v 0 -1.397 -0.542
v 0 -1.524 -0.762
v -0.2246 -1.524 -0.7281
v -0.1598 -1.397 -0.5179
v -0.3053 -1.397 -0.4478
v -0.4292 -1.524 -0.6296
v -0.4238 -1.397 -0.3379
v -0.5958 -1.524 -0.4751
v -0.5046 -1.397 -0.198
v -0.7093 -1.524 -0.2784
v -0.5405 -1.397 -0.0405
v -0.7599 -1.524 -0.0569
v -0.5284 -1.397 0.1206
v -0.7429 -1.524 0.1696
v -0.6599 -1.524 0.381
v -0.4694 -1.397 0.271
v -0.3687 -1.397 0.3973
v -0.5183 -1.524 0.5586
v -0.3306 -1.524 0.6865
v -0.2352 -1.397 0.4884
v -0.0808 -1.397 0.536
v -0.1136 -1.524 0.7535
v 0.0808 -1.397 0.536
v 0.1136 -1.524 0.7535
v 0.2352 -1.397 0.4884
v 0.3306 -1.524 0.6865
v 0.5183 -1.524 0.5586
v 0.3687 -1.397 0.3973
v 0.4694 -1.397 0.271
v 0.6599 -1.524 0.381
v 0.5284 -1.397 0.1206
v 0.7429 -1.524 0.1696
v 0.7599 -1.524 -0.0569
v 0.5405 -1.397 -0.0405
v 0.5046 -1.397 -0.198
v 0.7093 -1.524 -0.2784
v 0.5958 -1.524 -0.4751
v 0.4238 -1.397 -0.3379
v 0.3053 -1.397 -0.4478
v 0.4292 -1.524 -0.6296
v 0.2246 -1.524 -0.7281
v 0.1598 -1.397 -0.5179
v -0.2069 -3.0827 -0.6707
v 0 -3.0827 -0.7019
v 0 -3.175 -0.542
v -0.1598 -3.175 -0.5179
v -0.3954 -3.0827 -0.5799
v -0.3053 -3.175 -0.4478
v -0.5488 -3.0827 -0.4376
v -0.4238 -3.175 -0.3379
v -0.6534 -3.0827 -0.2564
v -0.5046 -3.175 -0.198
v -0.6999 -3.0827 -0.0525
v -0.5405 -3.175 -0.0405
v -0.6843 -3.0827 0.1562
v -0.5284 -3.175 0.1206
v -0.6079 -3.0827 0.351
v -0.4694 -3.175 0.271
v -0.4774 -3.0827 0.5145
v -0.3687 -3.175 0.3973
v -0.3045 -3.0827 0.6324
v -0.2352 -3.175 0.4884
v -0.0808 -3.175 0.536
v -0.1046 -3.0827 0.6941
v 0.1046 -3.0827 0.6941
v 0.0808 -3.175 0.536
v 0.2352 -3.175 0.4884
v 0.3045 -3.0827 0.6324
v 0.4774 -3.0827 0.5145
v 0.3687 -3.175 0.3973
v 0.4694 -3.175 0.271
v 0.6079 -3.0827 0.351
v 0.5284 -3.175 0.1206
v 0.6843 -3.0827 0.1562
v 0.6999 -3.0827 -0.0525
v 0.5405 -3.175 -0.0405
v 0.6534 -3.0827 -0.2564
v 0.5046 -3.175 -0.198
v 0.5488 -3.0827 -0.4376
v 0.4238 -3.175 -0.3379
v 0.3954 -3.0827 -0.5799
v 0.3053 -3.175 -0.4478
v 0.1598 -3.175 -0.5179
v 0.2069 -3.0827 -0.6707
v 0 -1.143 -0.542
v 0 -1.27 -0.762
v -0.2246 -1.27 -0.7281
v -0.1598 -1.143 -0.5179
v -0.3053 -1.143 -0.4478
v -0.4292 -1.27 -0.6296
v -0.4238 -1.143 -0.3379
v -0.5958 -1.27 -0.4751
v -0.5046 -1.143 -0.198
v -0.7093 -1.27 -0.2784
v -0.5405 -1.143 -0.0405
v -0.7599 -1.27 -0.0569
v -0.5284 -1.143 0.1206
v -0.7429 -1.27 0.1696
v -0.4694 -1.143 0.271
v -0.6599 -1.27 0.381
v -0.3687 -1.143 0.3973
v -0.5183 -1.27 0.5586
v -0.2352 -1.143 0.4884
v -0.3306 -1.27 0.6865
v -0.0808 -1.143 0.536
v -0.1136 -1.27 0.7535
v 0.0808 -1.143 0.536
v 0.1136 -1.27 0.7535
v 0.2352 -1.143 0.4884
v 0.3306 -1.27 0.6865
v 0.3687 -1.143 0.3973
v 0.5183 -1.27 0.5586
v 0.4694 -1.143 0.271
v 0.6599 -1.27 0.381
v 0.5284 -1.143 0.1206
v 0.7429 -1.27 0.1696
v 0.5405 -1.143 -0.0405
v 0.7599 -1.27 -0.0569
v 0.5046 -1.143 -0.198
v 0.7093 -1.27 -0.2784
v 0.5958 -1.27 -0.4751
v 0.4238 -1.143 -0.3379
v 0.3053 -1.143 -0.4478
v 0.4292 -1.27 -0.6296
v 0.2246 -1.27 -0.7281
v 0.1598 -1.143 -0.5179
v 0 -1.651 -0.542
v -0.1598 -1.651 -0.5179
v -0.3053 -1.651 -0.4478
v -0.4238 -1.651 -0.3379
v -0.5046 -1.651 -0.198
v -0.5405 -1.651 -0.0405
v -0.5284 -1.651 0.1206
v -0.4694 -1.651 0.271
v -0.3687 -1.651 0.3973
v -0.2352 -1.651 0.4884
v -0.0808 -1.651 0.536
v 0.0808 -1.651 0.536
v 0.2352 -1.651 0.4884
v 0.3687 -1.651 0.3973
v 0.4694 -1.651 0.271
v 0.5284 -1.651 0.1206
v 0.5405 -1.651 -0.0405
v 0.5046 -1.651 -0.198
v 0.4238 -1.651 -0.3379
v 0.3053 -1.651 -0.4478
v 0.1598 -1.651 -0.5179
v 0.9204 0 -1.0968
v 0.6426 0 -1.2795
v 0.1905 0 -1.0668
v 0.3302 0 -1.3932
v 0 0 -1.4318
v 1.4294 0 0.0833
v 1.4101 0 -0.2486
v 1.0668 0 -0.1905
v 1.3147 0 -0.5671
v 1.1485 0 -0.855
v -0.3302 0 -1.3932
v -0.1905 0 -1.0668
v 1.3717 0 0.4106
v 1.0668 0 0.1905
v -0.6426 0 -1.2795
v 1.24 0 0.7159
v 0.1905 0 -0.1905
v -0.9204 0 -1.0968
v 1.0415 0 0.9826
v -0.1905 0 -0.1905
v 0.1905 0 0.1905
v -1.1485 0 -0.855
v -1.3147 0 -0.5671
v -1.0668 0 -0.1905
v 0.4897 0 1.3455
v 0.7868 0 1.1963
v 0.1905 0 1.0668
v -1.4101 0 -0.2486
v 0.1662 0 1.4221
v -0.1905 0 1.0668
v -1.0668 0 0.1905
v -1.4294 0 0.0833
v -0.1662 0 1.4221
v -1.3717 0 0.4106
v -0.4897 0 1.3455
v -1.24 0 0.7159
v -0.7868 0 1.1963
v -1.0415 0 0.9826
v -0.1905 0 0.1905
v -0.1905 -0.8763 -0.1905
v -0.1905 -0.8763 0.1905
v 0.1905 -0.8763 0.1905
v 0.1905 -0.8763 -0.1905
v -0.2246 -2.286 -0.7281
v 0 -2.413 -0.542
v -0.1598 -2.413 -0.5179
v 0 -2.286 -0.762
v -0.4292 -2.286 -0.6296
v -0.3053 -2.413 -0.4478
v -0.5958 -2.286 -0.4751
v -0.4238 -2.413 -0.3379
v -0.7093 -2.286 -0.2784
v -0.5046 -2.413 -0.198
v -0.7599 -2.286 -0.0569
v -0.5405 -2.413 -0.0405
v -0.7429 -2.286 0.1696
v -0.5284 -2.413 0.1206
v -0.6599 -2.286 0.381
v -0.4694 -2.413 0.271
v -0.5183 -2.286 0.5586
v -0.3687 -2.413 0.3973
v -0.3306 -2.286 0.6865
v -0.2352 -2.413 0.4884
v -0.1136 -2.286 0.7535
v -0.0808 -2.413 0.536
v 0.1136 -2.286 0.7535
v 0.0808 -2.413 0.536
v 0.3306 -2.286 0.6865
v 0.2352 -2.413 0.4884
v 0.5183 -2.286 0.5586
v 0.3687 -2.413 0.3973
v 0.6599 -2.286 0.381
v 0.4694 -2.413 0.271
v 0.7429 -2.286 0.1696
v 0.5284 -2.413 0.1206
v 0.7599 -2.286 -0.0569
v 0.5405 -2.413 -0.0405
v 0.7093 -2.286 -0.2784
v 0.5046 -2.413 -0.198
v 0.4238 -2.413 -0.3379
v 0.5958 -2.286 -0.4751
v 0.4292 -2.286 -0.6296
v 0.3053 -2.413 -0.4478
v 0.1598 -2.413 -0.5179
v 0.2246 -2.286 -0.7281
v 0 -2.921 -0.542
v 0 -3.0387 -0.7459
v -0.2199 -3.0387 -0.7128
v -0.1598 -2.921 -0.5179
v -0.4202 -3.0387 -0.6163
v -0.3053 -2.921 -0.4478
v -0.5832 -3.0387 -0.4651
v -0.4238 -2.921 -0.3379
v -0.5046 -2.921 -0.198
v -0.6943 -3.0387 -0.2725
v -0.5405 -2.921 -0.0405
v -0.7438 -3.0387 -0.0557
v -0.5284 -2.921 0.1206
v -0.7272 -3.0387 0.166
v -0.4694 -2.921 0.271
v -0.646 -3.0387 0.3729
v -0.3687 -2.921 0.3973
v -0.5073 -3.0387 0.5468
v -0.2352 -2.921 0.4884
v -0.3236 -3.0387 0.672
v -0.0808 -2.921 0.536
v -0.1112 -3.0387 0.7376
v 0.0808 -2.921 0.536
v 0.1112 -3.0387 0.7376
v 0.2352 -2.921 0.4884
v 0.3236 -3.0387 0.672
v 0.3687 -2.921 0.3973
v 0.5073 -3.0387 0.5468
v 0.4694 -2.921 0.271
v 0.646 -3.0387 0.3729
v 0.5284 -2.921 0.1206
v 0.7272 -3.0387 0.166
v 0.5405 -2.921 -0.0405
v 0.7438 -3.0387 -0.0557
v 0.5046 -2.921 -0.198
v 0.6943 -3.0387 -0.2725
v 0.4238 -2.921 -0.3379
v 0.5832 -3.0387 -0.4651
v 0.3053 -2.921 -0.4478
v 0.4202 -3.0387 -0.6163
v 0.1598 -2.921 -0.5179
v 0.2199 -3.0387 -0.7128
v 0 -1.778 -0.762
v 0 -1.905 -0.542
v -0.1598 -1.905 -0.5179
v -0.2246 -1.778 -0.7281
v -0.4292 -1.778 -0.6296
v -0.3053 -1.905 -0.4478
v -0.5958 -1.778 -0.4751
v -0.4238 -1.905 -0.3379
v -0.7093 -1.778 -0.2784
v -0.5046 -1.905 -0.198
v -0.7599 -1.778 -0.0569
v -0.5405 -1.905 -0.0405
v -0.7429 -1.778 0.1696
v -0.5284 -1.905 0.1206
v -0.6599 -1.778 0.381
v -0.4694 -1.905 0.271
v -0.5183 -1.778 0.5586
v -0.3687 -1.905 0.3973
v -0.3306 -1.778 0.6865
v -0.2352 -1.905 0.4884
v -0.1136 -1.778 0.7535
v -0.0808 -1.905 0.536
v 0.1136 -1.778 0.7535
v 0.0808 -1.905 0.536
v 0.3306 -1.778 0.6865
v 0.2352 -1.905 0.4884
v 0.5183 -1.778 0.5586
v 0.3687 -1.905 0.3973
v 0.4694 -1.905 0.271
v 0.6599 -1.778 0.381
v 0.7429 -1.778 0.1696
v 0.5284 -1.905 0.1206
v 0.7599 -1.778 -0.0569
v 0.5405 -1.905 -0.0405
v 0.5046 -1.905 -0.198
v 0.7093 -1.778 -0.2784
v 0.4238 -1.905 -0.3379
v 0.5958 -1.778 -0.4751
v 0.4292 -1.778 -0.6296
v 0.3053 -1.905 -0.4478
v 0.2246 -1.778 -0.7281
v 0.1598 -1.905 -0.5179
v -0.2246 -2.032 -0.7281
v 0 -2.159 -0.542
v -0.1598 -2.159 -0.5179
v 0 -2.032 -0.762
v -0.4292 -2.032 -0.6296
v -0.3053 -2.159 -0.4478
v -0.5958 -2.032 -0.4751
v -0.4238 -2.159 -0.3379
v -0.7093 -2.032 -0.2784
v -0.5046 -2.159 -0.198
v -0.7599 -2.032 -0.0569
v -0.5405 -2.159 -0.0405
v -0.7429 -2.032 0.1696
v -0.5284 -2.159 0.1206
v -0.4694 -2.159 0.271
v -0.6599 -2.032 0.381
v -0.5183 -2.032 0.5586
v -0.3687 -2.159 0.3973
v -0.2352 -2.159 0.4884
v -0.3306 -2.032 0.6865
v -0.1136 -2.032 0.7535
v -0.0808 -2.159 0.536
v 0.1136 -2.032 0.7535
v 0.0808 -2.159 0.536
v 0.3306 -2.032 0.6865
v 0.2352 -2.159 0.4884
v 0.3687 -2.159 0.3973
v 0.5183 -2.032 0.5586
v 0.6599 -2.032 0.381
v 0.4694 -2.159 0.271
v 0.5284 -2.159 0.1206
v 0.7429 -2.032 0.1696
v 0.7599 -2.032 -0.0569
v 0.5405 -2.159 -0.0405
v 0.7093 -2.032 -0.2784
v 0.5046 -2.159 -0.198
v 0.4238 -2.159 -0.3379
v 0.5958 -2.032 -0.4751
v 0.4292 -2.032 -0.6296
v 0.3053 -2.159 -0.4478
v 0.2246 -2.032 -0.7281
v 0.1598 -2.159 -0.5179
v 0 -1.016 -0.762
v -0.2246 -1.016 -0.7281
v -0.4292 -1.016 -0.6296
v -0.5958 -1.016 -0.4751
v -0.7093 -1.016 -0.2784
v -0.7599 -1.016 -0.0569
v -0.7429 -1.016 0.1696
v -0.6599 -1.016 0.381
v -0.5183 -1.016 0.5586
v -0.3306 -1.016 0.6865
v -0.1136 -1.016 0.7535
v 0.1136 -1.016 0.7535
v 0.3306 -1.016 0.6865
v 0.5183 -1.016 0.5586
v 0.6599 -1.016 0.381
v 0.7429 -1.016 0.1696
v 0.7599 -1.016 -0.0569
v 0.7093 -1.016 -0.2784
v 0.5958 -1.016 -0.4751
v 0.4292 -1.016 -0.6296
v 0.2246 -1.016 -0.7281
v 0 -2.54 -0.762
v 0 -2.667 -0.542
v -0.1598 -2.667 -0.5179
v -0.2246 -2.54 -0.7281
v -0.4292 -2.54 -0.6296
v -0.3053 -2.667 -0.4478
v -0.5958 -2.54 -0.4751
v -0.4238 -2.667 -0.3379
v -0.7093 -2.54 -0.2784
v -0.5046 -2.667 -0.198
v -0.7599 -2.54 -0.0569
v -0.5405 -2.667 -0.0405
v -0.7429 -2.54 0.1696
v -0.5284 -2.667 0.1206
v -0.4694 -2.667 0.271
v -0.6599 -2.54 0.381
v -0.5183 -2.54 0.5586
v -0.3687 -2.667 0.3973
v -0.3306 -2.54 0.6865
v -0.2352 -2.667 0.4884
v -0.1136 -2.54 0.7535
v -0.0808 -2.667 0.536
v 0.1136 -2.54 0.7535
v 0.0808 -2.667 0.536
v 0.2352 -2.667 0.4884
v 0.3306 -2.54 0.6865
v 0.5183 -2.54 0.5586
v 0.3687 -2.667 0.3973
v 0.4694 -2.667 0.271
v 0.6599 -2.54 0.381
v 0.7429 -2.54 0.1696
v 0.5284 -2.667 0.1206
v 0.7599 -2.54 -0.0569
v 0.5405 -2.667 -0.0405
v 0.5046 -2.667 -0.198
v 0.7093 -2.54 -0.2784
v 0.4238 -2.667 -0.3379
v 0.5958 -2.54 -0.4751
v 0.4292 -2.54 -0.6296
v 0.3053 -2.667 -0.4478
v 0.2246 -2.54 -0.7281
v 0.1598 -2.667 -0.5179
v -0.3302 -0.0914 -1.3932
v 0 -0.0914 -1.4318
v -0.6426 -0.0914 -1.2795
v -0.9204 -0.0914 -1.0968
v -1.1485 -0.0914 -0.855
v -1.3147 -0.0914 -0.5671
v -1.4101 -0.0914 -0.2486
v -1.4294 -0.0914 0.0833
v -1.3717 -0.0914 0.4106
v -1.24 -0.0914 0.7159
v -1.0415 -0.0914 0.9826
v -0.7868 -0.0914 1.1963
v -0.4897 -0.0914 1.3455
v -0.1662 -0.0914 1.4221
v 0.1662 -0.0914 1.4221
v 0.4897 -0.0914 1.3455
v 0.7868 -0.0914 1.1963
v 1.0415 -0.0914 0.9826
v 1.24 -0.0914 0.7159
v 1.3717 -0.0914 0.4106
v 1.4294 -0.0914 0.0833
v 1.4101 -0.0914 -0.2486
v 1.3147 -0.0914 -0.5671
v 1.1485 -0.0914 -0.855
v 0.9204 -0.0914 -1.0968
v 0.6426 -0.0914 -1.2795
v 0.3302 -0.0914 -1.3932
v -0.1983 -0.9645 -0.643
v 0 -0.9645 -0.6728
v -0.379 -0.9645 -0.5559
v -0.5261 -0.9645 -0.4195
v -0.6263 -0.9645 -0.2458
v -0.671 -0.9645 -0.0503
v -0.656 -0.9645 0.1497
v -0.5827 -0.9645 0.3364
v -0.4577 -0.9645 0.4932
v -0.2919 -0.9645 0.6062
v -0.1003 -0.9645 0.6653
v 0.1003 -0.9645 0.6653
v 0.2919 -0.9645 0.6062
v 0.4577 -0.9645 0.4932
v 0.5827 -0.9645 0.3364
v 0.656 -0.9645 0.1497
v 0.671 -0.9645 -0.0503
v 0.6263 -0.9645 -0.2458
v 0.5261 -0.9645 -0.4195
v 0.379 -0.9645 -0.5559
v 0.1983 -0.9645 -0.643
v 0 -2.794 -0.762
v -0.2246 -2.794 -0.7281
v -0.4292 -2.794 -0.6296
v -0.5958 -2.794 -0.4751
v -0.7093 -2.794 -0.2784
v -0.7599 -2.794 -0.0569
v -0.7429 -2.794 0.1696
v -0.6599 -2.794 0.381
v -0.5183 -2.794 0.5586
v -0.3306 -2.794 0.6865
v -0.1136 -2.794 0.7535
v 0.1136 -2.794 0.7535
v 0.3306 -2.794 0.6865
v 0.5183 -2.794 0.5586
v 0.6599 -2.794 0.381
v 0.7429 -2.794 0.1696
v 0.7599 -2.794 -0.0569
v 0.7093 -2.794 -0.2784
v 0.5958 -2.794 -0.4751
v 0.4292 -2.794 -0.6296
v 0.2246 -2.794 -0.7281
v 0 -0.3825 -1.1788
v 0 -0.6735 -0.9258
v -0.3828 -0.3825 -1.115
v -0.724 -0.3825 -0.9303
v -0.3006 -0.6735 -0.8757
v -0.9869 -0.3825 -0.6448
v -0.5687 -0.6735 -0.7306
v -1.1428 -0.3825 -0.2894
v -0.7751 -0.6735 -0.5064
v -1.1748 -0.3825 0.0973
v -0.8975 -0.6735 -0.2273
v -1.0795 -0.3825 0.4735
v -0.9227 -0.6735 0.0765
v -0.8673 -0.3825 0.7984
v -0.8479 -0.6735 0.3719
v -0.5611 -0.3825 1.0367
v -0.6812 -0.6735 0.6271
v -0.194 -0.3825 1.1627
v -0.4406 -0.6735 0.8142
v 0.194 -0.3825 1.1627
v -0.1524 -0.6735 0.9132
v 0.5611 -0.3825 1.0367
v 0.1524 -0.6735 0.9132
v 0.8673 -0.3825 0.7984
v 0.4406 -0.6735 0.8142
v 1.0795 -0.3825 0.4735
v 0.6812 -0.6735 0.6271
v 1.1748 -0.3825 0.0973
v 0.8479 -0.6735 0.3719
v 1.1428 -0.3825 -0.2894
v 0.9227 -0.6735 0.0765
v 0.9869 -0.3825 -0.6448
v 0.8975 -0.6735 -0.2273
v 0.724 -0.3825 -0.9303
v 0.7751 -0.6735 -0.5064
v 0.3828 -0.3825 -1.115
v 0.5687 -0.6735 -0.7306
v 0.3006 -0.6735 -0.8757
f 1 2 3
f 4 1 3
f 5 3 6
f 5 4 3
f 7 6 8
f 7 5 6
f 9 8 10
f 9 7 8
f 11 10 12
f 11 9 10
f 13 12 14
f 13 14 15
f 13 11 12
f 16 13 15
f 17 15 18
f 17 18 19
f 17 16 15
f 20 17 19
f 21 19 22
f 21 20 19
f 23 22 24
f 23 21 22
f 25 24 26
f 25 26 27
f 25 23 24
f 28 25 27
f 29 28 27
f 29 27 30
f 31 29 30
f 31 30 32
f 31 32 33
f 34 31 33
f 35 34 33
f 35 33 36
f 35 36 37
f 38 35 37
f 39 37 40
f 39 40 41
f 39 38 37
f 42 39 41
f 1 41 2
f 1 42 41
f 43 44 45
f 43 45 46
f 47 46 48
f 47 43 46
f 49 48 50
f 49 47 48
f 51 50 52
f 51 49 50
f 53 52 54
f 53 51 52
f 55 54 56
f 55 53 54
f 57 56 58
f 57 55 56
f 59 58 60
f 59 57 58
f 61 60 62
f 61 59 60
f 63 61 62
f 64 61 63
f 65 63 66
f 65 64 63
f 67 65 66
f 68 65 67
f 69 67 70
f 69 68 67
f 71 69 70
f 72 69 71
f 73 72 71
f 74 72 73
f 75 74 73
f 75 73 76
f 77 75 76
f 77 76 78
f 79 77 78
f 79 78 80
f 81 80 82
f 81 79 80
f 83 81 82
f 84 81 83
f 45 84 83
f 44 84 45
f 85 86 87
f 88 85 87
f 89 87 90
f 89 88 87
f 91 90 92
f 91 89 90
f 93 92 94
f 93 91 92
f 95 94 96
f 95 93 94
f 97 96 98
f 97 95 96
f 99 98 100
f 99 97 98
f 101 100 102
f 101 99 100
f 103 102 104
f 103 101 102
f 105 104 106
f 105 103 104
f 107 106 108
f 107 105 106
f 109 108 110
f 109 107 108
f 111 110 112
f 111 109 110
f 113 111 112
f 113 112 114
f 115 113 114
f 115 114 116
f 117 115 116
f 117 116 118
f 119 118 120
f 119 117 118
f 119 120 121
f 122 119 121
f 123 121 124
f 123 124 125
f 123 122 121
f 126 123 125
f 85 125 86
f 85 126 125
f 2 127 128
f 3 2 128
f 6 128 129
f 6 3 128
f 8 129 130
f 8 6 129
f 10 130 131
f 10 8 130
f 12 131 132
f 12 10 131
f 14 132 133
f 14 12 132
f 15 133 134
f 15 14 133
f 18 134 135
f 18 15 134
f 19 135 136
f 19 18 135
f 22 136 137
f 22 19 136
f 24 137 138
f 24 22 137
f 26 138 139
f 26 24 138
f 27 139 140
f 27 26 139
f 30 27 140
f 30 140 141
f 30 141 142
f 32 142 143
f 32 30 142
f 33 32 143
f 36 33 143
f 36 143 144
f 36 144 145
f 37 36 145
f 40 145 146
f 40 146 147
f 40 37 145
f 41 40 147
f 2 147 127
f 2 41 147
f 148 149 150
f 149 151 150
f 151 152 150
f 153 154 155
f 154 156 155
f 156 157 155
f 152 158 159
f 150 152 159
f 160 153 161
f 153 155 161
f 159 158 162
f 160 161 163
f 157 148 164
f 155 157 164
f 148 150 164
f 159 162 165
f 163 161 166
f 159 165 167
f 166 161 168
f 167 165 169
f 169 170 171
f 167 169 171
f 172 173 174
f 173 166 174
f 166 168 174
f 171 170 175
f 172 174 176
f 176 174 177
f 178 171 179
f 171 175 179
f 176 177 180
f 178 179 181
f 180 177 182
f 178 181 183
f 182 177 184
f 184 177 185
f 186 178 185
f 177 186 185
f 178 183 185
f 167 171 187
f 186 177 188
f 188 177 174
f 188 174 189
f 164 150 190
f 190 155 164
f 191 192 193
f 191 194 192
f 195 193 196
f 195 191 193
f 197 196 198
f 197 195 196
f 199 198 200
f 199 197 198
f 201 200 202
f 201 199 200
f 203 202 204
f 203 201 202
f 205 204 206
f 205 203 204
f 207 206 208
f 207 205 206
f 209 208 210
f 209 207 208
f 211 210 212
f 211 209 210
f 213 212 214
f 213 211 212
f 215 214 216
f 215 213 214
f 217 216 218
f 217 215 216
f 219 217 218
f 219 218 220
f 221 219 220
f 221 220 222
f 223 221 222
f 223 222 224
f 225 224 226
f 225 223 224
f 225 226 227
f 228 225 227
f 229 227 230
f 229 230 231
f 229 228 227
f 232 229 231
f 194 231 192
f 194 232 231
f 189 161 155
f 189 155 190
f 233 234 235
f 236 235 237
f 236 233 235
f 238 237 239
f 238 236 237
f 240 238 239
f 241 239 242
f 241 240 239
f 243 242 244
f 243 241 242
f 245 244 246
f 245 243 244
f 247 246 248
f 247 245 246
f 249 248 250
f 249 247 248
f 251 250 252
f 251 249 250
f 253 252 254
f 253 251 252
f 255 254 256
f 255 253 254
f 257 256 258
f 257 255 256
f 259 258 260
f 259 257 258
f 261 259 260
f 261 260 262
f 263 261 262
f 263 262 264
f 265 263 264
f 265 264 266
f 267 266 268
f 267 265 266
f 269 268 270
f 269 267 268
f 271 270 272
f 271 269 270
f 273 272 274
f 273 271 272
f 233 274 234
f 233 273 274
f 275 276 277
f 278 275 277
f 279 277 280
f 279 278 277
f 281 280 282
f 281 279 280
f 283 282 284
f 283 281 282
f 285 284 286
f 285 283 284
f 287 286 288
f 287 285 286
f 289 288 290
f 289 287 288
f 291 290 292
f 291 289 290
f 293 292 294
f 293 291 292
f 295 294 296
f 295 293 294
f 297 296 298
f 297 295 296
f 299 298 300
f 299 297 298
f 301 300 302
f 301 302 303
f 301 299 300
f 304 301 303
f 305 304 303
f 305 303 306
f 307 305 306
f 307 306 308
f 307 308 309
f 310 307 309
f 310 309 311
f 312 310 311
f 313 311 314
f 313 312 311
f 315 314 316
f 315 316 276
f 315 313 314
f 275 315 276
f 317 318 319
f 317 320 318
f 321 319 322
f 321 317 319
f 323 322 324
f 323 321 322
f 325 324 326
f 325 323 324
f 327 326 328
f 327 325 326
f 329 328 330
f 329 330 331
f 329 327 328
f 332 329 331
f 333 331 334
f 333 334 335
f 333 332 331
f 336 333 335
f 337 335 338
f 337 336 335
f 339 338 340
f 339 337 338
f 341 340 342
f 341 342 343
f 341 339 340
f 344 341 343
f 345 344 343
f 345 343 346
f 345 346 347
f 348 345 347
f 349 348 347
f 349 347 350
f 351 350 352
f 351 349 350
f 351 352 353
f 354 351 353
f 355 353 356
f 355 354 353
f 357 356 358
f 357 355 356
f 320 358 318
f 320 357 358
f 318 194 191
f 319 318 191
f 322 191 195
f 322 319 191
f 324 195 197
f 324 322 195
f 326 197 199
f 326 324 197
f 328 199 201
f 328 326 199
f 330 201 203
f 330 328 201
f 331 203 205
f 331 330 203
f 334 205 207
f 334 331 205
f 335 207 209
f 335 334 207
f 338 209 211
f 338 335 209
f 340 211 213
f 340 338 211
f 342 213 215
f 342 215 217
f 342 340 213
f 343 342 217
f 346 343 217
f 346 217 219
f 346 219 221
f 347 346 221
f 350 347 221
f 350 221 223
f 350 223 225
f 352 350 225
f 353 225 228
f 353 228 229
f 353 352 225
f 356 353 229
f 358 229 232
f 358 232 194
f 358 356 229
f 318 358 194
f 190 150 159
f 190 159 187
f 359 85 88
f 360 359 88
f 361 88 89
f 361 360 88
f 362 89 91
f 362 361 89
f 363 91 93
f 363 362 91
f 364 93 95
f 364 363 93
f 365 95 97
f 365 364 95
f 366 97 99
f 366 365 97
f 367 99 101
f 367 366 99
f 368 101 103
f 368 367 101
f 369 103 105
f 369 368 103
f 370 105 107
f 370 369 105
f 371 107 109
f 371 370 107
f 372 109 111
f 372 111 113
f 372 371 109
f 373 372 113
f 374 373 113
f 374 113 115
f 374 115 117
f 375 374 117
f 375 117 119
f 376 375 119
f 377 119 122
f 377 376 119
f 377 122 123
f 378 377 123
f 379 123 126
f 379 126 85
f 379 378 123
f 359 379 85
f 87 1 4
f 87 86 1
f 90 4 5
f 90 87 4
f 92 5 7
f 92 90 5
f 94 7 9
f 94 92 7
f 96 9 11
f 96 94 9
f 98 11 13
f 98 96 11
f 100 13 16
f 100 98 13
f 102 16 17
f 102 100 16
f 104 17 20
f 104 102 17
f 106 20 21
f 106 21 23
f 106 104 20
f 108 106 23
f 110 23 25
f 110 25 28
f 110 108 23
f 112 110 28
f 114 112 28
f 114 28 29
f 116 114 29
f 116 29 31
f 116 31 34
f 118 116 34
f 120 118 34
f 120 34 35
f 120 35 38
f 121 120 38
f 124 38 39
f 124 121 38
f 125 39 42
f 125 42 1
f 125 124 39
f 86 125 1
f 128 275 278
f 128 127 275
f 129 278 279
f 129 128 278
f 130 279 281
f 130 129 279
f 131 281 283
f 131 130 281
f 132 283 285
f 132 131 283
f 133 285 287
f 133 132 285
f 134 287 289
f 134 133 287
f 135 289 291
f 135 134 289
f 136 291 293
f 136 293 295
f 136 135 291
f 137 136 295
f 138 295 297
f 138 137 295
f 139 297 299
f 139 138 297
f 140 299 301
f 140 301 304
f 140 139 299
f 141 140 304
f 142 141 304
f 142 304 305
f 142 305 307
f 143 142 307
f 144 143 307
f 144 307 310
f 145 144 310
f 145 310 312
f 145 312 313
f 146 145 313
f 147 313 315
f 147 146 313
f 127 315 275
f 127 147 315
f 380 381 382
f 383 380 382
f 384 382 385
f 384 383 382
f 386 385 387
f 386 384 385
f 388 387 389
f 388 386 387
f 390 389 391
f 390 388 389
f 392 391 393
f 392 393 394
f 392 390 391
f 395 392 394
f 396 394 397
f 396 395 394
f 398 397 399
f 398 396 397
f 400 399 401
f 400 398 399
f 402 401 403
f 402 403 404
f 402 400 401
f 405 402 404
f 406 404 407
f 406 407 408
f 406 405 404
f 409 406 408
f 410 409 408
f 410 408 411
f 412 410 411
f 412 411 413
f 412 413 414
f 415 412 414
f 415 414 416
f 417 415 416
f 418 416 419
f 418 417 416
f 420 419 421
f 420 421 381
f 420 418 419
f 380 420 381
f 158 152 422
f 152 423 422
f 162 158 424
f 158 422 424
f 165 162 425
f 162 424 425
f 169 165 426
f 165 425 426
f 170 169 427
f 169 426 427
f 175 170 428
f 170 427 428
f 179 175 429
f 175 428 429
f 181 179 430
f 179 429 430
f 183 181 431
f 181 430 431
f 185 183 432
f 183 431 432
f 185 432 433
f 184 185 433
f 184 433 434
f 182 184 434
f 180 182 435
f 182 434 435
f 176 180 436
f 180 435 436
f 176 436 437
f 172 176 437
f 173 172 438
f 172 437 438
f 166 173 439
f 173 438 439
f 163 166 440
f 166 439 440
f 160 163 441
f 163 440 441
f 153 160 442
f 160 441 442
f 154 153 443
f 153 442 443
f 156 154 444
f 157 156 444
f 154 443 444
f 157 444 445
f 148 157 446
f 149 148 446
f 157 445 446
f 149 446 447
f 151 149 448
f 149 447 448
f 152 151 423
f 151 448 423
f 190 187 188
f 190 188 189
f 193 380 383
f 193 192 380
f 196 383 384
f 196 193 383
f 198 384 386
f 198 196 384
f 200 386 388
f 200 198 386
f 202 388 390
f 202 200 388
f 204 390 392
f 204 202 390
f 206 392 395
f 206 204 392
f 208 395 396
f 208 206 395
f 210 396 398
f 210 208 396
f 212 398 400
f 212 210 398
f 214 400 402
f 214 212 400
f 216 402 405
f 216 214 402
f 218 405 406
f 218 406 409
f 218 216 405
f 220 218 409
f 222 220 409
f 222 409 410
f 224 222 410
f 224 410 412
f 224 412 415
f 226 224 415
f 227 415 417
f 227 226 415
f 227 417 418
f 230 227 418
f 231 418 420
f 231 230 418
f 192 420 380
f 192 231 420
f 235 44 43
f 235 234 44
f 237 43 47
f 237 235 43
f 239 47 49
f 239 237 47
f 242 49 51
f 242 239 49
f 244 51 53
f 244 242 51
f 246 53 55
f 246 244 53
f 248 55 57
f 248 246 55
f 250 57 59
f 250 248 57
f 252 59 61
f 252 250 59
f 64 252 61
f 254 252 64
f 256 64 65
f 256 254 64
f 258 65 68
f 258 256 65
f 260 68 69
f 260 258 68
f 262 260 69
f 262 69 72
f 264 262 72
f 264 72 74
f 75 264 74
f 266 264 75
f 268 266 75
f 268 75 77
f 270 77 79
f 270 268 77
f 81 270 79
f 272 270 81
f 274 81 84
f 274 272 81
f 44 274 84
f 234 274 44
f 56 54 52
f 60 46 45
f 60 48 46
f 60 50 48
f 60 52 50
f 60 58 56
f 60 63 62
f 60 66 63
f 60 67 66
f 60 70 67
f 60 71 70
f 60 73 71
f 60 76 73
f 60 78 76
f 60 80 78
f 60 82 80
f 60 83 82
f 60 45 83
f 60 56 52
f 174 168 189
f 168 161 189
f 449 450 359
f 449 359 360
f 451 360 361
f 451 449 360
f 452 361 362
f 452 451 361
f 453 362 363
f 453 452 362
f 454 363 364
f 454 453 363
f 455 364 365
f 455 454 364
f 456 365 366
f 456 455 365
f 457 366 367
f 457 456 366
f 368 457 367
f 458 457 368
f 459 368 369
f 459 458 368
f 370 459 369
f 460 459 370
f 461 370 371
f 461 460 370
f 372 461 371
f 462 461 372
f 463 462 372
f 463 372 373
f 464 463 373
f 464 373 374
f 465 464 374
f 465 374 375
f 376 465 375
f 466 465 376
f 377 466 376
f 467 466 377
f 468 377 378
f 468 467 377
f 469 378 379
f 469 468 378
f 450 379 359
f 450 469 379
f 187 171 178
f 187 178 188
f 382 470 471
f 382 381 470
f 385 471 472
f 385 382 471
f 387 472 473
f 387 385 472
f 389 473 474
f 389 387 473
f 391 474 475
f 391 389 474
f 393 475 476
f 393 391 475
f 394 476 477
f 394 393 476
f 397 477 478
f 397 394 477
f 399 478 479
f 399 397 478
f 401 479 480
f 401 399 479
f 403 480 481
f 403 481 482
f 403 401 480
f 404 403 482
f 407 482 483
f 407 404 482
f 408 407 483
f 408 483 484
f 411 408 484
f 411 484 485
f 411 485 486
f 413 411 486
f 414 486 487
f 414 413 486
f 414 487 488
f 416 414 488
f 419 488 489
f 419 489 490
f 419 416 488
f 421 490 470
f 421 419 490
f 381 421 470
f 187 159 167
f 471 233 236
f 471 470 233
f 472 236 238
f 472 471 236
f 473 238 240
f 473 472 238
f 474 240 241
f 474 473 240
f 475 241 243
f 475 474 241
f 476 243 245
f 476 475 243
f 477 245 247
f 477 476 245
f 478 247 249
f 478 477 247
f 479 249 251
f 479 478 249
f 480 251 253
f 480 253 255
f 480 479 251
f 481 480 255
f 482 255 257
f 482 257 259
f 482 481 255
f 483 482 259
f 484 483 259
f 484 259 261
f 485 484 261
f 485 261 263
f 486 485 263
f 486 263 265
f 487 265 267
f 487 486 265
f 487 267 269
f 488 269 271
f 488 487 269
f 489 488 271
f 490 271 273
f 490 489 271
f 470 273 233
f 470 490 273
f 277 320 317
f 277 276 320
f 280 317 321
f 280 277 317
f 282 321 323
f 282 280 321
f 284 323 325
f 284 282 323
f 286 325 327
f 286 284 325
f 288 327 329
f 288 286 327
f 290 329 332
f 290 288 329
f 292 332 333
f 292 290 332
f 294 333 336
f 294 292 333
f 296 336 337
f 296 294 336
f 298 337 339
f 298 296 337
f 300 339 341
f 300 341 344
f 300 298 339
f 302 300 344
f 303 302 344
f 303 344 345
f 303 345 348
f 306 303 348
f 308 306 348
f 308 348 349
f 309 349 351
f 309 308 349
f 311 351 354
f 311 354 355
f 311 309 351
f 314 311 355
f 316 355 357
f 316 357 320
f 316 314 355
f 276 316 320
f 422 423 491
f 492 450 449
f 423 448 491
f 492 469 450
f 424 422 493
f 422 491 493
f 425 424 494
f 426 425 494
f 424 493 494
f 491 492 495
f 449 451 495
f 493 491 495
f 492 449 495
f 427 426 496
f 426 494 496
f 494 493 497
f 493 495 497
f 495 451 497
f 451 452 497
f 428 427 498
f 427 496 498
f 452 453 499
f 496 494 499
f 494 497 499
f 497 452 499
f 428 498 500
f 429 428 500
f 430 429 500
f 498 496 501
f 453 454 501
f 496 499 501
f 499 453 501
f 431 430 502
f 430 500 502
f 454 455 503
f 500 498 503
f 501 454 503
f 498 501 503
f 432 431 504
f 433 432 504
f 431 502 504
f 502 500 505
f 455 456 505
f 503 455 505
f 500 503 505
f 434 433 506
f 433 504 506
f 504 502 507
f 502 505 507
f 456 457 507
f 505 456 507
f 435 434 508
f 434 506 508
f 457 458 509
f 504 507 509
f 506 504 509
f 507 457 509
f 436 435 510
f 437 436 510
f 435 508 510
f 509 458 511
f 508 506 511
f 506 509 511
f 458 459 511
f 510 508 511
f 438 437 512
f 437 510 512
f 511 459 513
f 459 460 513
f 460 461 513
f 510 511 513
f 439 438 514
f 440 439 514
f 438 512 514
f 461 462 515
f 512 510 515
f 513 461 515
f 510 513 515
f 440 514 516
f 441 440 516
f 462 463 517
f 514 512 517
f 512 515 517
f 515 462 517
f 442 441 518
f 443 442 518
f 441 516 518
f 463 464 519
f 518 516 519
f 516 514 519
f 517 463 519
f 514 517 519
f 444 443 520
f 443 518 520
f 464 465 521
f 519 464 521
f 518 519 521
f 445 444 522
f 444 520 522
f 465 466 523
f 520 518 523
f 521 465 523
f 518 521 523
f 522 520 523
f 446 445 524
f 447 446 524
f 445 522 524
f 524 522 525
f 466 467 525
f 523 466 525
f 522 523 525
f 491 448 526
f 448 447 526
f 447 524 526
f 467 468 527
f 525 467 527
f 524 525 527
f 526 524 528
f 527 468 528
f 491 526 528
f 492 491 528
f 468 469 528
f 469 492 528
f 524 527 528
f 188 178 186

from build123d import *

# Parameters (mm, degrees)
CUT_EXTRUDE1_DEPTH = 0.1905
CIRPATTERN1_COUNT  = 4


with BuildPart() as part:
    # Sketch3 → Shank Revolve ( driven ) (revolve)
    with BuildSketch(Plane.XY, mode=Mode.PRIVATE) as shank_revolve_driven_sk:
        Polygon((0, 0), (0, -3.175), (0.6096, -3.175), (0.762, -3.0226), (0.762, 0), align=None)
    revolve(shank_revolve_driven_sk.sketch.rotate(Axis((0, -50, 0), (0, 1, 0)), 90), axis=Axis((0, -50, 0), (0, 1, 0)))

    # Sketch4 → Thread Revolve Cut ( driven ) (revolve, cut)
    with BuildSketch(Plane.XY, mode=Mode.PRIVATE) as thread_revolve_cut_driven_sk:
        Polygon((0.542029547, 0.635), (0.762, 0.762), (1.27, 0.762), (1.27, -3.81), (0.762, -3.81), (0.542029547, -3.683), (0.762, -3.556), (0.542029547, -3.429), (0.762, -3.302), (0.542029547, -3.175), (0.762, -3.048), (0.542029547, -2.921), (0.762, -2.794), (0.542029547, -2.667), (0.762, -2.54), (0.542029547, -2.413), (0.762, -2.286), (0.542029547, -2.159), (0.762, -2.032), (0.542029547, -1.905), (0.762, -1.778), (0.542029547, -1.651), (0.762, -1.524), (0.542029547, -1.397), (0.762, -1.27), (0.542029547, -1.143), (0.762, -1.016), (0.542029547, -0.889), (0.762, -0.762), (0.542029547, -0.635), (0.762, -0.508), (0.542029547, -0.381), (0.762, -0.254), (0.542029547, -0.127), (0.762, 0), (0.542029547, 0.127), (0.762, 0.254), (0.542029547, 0.381), (0.762, 0.508), align=None)
    revolve(thread_revolve_cut_driven_sk.sketch.rotate(Axis((0, -50, 0), (0, 1, 0)), 90), axis=Axis((0, -50, 0), (0, 1, 0)), mode=Mode.SUBTRACT)

    # Sketch5 → Head Revolve ( driven ) (revolve)
    with BuildSketch(Plane.XY, mode=Mode.PRIVATE) as head_revolve_driven_sk:
        Polygon((0, 0), (1.431812421, 0), (1.431812421, -0.09144), (0, -1.738551774), align=None)
    revolve(head_revolve_driven_sk.sketch.rotate(Axis((0, -50, 0), (0, 1, 0)), 90), axis=Axis((0, -50, 0), (0, 1, 0)))

    # Sketch7 → Cut-Extrude1 (cut, symmetric)
    with BuildSketch(Plane(origin=(0, 0, 0), x_dir=(0, 0, -1), z_dir=(1, 0, 0))):
        Polygon((0, 0.508), (1.5748, 0.508), (0.1905, -0.8763), (0, -0.8763), align=None)
    cut_extrude1 = extrude(amount=CUT_EXTRUDE1_DEPTH, both=True, mode=Mode.SUBTRACT)

    # CirPattern1: Cut-Extrude1 ×4 about axis
    cirpattern1_axis = Axis((0, 0, 0), (0, 1, 0))
    for i in range(1, CIRPATTERN1_COUNT):
        add(cut_extrude1.rotate(cirpattern1_axis, i * 360 / CIRPATTERN1_COUNT), mode=Mode.SUBTRACT)


solid = part.part
